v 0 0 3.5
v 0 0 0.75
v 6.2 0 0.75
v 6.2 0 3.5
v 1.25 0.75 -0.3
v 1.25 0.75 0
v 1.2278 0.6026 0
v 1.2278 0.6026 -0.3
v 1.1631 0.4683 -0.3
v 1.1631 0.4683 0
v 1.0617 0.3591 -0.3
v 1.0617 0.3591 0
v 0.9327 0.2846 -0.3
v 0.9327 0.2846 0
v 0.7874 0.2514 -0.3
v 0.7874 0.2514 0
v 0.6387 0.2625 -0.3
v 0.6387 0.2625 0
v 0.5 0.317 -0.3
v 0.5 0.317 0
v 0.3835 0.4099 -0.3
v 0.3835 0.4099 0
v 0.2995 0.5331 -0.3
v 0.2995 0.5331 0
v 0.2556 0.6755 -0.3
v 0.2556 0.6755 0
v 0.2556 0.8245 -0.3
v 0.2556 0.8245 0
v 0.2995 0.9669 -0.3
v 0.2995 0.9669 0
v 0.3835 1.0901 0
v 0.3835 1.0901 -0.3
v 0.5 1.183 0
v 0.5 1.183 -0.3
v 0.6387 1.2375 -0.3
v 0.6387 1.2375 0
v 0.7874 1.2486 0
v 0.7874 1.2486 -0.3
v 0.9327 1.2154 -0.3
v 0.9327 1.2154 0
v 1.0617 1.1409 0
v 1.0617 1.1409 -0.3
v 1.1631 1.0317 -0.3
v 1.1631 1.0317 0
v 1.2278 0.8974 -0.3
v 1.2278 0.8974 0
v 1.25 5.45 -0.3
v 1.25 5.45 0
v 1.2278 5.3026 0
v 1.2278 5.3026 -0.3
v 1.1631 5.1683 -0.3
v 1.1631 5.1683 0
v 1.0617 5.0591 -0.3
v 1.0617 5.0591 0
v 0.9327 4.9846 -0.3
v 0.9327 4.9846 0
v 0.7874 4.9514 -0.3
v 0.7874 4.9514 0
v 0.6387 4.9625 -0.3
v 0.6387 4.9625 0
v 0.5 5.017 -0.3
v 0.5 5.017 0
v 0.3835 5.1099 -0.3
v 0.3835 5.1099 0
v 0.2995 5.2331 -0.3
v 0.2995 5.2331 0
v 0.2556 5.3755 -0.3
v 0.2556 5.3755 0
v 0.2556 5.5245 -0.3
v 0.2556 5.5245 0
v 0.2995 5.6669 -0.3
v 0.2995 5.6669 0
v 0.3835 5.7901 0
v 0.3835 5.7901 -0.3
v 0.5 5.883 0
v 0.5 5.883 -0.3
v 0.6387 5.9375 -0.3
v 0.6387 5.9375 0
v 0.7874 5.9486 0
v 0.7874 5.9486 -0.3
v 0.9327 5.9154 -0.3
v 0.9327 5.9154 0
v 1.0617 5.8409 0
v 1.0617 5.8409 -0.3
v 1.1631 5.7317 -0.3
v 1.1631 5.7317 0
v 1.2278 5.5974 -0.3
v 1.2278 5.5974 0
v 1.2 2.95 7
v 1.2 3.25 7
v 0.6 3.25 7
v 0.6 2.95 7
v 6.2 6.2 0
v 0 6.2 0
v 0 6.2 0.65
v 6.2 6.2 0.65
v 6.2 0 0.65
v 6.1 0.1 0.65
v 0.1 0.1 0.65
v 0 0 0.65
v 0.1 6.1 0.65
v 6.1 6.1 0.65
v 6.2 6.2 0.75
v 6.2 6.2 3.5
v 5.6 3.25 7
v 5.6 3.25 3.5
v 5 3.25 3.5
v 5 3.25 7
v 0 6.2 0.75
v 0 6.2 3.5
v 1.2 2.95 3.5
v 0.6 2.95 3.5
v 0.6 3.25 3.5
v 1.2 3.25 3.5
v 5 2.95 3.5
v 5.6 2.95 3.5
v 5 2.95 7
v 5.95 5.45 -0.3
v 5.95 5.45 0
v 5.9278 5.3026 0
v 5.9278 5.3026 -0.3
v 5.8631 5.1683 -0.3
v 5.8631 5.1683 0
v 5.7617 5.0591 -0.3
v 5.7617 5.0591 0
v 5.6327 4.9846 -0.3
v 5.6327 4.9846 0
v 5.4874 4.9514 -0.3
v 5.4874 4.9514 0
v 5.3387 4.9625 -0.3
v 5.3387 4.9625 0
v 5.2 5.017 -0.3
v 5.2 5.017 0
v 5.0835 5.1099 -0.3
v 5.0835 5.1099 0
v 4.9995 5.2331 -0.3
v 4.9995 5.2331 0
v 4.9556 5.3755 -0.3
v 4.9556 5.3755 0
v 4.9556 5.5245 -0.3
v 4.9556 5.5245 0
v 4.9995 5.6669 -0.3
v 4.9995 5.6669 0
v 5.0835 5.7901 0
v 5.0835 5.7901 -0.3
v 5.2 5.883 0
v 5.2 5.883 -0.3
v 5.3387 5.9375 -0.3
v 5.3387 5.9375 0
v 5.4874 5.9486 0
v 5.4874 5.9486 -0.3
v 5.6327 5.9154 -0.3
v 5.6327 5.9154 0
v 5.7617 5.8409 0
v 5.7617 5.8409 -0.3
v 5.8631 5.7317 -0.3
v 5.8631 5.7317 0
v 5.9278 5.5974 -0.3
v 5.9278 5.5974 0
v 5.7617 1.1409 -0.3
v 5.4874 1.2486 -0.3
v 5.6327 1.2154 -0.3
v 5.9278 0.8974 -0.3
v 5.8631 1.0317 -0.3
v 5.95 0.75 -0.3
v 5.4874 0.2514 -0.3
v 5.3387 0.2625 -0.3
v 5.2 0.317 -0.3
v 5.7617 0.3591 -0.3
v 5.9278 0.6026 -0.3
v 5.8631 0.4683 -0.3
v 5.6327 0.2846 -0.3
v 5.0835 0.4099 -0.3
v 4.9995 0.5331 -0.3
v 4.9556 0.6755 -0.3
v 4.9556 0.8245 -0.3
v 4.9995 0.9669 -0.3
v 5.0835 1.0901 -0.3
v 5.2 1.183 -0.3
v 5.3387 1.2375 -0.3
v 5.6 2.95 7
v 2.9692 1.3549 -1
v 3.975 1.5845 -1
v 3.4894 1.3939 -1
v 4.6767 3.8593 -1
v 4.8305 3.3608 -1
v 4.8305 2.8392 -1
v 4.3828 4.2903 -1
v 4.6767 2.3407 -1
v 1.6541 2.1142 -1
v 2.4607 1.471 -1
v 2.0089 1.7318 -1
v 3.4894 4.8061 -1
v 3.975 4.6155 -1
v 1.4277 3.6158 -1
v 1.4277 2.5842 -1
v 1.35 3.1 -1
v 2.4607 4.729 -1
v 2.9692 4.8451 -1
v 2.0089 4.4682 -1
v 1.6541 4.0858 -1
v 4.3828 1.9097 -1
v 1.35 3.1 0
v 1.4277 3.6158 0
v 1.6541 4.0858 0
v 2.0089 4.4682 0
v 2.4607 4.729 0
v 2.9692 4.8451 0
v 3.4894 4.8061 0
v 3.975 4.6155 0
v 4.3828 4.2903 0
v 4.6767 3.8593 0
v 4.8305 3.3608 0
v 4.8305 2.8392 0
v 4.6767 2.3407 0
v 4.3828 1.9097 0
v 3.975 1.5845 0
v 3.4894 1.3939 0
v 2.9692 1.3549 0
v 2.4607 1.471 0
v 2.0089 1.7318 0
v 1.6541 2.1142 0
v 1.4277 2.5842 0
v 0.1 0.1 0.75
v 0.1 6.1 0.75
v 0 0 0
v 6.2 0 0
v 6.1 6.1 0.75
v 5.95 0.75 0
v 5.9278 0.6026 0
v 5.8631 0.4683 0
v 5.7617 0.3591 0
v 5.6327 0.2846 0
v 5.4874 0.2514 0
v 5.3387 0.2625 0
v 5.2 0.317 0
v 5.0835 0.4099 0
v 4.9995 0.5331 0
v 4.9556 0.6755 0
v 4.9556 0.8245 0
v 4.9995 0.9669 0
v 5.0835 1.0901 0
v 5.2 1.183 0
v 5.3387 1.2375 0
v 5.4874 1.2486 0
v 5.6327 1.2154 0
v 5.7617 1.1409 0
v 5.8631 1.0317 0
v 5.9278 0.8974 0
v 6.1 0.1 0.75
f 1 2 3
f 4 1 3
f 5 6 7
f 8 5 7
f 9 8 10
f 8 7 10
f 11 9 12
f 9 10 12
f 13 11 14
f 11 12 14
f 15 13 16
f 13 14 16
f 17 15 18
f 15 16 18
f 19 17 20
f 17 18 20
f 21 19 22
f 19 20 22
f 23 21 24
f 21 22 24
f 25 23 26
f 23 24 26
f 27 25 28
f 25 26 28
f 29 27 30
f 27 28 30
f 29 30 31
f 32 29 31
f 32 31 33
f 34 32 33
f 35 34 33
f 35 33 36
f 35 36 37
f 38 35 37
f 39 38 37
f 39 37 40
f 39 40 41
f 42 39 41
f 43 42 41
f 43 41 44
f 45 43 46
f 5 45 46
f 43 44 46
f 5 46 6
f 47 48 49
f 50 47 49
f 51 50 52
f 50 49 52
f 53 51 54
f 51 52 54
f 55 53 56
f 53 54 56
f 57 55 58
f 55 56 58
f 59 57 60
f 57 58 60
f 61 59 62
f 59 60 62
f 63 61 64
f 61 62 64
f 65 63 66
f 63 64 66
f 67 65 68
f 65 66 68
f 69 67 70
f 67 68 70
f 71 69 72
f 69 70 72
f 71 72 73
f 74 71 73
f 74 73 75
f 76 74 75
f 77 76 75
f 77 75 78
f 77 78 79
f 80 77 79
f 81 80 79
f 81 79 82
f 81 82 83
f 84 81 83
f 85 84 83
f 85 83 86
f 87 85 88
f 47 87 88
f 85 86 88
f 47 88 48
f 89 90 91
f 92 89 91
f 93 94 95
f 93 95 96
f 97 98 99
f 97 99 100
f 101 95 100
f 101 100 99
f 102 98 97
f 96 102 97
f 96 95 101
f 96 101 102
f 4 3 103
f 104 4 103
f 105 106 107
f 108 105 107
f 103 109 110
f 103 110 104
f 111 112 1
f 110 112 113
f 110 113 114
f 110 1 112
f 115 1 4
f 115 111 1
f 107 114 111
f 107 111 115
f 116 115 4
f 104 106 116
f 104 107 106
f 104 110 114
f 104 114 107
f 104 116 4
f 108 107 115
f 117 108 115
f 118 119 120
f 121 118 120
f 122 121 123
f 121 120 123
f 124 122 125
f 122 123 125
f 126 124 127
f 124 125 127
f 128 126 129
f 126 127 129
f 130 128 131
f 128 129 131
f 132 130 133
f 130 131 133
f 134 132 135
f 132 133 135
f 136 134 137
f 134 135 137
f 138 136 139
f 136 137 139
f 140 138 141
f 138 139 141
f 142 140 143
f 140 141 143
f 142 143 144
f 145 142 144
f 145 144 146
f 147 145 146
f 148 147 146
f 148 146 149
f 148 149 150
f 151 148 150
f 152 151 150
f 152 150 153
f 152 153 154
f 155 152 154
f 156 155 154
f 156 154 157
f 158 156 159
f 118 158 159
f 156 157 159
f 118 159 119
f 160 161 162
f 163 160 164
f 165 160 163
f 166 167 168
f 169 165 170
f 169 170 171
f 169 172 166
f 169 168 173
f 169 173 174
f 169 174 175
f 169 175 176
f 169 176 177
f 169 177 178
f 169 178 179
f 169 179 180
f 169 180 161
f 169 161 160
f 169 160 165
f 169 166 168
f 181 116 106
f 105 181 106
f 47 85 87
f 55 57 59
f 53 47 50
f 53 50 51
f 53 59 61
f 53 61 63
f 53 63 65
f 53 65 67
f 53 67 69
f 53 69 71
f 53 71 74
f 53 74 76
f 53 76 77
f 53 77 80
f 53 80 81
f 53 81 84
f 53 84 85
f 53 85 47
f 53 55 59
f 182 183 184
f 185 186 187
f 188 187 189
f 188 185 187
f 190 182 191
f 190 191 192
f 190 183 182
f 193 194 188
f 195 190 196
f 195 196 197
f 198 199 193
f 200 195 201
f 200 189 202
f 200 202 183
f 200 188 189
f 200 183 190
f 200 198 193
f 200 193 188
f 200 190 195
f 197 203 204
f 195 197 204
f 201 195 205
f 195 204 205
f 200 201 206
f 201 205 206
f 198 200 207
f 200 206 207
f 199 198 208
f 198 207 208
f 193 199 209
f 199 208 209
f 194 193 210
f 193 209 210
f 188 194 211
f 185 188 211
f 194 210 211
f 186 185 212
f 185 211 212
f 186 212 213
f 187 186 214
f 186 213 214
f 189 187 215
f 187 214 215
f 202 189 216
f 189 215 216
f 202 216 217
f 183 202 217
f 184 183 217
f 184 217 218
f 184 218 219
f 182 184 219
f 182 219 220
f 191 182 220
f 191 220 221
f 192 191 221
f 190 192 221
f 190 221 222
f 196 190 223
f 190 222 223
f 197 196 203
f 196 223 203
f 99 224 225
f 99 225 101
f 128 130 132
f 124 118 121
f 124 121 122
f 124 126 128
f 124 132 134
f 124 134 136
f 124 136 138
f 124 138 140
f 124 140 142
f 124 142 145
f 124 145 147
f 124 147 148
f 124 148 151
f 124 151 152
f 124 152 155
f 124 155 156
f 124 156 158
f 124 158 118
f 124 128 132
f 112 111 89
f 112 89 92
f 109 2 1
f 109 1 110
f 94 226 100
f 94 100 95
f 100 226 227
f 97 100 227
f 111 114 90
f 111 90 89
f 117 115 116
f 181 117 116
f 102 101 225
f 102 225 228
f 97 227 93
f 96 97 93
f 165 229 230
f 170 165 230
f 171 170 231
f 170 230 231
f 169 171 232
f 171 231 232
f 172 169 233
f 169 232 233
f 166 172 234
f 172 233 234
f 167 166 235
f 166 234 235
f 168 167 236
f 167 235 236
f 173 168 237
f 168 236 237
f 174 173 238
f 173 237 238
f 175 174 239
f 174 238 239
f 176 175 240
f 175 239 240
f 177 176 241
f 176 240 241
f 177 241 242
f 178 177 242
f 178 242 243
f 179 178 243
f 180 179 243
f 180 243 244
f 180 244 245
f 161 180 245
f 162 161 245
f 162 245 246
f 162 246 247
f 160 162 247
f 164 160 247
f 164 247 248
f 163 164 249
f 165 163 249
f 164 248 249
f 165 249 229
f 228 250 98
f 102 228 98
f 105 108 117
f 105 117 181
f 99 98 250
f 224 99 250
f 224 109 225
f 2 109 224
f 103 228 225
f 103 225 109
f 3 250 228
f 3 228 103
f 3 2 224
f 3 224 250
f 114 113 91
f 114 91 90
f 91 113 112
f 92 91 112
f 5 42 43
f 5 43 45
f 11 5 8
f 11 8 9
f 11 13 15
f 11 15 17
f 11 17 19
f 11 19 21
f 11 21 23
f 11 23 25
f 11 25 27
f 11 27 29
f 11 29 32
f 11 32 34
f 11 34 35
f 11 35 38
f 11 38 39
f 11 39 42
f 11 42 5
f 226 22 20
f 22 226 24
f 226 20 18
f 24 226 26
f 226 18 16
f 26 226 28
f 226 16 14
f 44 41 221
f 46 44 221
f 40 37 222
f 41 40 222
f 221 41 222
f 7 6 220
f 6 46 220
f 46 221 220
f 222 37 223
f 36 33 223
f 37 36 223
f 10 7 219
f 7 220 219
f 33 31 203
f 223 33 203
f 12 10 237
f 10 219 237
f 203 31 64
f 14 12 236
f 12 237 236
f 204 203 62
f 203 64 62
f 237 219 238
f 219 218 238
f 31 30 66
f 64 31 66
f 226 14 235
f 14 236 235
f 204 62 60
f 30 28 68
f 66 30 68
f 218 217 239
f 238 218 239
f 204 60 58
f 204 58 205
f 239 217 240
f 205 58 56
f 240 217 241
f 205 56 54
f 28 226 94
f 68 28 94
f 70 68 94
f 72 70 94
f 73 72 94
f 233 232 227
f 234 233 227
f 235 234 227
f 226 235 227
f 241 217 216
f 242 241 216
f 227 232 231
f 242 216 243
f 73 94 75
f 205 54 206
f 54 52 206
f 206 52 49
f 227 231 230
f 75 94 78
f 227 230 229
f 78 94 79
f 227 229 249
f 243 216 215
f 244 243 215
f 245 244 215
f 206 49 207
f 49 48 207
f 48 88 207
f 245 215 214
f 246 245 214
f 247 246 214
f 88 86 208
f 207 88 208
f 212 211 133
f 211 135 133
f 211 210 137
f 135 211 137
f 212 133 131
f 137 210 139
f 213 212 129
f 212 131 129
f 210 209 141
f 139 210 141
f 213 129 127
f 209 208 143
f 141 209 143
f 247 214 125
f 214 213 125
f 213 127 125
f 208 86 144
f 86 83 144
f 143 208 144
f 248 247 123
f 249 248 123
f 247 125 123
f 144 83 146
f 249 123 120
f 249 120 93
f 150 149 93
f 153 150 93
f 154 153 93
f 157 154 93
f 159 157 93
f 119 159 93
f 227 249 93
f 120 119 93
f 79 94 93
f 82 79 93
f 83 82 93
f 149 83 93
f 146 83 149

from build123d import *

# Parameters (mm, degrees)
CROQUIS1_W                 = 6.2
CROQUIS1_H                 = 6.2
SALIENTE_EXTRUIR1_DEPTH    = 3.5
CROQUIS2_W                 = 6.2
CROQUIS2_H                 = 0.1
CORTAR_EXTRUIR1_DEPTH      = 0.1
CORTAR_EXTRUIR2_DEPTH      = 10.375499987
CORTAR_EXTRUIR2_DEPTH_BACK = 10.375499987
CROQUIS3_W                 = 0.1
CROQUIS3_H                 = 0.1
CORTAR_EXTRUIR3_DEPTH      = 10.375499987
CORTAR_EXTRUIR3_DEPTH_BACK = 10.375499987
CROQUIS4_W                 = 0.1
CROQUIS4_H                 = 0.1
CROQUIS5_R                 = 1.75
SALIENTE_EXTRUIR2_DEPTH    = 1
CROQUIS6_R                 = 0.5
SALIENTE_EXTRUIR3_DEPTH    = 0.3
SALIENTE_EXTRUIR4_DEPTH    = 3.5


with BuildPart() as part:
    # Croquis1 → Saliente-Extruir1 (new body)
    with BuildSketch(Plane.XY):
        with Locations((3.1, 3.1)):
            Rectangle(CROQUIS1_W, CROQUIS1_H)
    extrude(amount=SALIENTE_EXTRUIR1_DEPTH)

    # Croquis2 → Cortar-Extruir1 (cut)
    with BuildSketch(Plane(origin=(0, 6.2, 0), x_dir=(1, 0, 0), z_dir=(0, 1, 0))):
        with Locations((3.1, -0.7)):
            Rectangle(CROQUIS2_W, CROQUIS2_H)
    extrude(amount=-CORTAR_EXTRUIR1_DEPTH, mode=Mode.SUBTRACT)

    # Croquis3 → Cortar-Extruir2 (cut, two sides: drawn at the far end of the back side and taken through both)
    with BuildSketch(Plane(origin=(0, 6.1, 0), x_dir=(1, 0, 0), z_dir=(0, 1, 0)).offset(-CORTAR_EXTRUIR2_DEPTH_BACK)):
        with Locations((0.05, -0.7)):
            Rectangle(CROQUIS3_W, CROQUIS3_H)
        with Locations((6.15, -0.7)):
            Rectangle(CROQUIS3_W, CROQUIS3_H)
    extrude(amount=CORTAR_EXTRUIR2_DEPTH + CORTAR_EXTRUIR2_DEPTH_BACK, mode=Mode.SUBTRACT)

    # Croquis4 → Cortar-Extruir3 (cut, two sides: drawn at the far end of the back side and taken through both)
    with BuildSketch(Plane.ZY.offset(-0.1).offset(-CORTAR_EXTRUIR3_DEPTH_BACK)):
        with Locations((0.7, 0.05)):
            Rectangle(CROQUIS4_W, CROQUIS4_H)
    extrude(amount=CORTAR_EXTRUIR3_DEPTH + CORTAR_EXTRUIR3_DEPTH_BACK, mode=Mode.SUBTRACT)

    # Croquis5 → Saliente-Extruir2 (add)
    with BuildSketch(Plane(origin=(0, 0, 0), x_dir=(-1, 0, 0), z_dir=(0, 0, -1))):
        with Locations((-3.1, 3.1)):
            Circle(CROQUIS5_R)
    extrude(amount=SALIENTE_EXTRUIR2_DEPTH)

    # Croquis6 → Saliente-Extruir3 (add)
    with BuildSketch(Plane(origin=(0, 0, 0), x_dir=(-1, 0, 0), z_dir=(0, 0, -1))):
        with Locations(Location((-0.75, 0.75, 0), (0, 0, 180))):
            Circle(CROQUIS6_R)
        with Locations(Location((-5.45, 0.75, 0), (0, 0, 180))):
            Circle(CROQUIS6_R)
        with Locations(Location((-0.75, 5.45, 0), (0, 0, 180))):
            Circle(CROQUIS6_R)
        with Locations(Location((-5.45, 5.45, 0), (0, 0, 180))):
            Circle(CROQUIS6_R)
    extrude(amount=SALIENTE_EXTRUIR3_DEPTH)

    # Croquis8 → Saliente-Extruir4 (add)
    with BuildSketch(Plane.XY.offset(3.5)):
        Polygon((5.6, 2.95), (5.6, 3.1), (5.6, 3.25), (5, 3.25), (5, 2.95), align=None)
        Polygon((0.6, 2.95), (0.6, 3.1), (0.6, 3.25), (1.2, 3.25), (1.2, 2.95), align=None)
    extrude(amount=SALIENTE_EXTRUIR4_DEPTH)


solid = part.part
